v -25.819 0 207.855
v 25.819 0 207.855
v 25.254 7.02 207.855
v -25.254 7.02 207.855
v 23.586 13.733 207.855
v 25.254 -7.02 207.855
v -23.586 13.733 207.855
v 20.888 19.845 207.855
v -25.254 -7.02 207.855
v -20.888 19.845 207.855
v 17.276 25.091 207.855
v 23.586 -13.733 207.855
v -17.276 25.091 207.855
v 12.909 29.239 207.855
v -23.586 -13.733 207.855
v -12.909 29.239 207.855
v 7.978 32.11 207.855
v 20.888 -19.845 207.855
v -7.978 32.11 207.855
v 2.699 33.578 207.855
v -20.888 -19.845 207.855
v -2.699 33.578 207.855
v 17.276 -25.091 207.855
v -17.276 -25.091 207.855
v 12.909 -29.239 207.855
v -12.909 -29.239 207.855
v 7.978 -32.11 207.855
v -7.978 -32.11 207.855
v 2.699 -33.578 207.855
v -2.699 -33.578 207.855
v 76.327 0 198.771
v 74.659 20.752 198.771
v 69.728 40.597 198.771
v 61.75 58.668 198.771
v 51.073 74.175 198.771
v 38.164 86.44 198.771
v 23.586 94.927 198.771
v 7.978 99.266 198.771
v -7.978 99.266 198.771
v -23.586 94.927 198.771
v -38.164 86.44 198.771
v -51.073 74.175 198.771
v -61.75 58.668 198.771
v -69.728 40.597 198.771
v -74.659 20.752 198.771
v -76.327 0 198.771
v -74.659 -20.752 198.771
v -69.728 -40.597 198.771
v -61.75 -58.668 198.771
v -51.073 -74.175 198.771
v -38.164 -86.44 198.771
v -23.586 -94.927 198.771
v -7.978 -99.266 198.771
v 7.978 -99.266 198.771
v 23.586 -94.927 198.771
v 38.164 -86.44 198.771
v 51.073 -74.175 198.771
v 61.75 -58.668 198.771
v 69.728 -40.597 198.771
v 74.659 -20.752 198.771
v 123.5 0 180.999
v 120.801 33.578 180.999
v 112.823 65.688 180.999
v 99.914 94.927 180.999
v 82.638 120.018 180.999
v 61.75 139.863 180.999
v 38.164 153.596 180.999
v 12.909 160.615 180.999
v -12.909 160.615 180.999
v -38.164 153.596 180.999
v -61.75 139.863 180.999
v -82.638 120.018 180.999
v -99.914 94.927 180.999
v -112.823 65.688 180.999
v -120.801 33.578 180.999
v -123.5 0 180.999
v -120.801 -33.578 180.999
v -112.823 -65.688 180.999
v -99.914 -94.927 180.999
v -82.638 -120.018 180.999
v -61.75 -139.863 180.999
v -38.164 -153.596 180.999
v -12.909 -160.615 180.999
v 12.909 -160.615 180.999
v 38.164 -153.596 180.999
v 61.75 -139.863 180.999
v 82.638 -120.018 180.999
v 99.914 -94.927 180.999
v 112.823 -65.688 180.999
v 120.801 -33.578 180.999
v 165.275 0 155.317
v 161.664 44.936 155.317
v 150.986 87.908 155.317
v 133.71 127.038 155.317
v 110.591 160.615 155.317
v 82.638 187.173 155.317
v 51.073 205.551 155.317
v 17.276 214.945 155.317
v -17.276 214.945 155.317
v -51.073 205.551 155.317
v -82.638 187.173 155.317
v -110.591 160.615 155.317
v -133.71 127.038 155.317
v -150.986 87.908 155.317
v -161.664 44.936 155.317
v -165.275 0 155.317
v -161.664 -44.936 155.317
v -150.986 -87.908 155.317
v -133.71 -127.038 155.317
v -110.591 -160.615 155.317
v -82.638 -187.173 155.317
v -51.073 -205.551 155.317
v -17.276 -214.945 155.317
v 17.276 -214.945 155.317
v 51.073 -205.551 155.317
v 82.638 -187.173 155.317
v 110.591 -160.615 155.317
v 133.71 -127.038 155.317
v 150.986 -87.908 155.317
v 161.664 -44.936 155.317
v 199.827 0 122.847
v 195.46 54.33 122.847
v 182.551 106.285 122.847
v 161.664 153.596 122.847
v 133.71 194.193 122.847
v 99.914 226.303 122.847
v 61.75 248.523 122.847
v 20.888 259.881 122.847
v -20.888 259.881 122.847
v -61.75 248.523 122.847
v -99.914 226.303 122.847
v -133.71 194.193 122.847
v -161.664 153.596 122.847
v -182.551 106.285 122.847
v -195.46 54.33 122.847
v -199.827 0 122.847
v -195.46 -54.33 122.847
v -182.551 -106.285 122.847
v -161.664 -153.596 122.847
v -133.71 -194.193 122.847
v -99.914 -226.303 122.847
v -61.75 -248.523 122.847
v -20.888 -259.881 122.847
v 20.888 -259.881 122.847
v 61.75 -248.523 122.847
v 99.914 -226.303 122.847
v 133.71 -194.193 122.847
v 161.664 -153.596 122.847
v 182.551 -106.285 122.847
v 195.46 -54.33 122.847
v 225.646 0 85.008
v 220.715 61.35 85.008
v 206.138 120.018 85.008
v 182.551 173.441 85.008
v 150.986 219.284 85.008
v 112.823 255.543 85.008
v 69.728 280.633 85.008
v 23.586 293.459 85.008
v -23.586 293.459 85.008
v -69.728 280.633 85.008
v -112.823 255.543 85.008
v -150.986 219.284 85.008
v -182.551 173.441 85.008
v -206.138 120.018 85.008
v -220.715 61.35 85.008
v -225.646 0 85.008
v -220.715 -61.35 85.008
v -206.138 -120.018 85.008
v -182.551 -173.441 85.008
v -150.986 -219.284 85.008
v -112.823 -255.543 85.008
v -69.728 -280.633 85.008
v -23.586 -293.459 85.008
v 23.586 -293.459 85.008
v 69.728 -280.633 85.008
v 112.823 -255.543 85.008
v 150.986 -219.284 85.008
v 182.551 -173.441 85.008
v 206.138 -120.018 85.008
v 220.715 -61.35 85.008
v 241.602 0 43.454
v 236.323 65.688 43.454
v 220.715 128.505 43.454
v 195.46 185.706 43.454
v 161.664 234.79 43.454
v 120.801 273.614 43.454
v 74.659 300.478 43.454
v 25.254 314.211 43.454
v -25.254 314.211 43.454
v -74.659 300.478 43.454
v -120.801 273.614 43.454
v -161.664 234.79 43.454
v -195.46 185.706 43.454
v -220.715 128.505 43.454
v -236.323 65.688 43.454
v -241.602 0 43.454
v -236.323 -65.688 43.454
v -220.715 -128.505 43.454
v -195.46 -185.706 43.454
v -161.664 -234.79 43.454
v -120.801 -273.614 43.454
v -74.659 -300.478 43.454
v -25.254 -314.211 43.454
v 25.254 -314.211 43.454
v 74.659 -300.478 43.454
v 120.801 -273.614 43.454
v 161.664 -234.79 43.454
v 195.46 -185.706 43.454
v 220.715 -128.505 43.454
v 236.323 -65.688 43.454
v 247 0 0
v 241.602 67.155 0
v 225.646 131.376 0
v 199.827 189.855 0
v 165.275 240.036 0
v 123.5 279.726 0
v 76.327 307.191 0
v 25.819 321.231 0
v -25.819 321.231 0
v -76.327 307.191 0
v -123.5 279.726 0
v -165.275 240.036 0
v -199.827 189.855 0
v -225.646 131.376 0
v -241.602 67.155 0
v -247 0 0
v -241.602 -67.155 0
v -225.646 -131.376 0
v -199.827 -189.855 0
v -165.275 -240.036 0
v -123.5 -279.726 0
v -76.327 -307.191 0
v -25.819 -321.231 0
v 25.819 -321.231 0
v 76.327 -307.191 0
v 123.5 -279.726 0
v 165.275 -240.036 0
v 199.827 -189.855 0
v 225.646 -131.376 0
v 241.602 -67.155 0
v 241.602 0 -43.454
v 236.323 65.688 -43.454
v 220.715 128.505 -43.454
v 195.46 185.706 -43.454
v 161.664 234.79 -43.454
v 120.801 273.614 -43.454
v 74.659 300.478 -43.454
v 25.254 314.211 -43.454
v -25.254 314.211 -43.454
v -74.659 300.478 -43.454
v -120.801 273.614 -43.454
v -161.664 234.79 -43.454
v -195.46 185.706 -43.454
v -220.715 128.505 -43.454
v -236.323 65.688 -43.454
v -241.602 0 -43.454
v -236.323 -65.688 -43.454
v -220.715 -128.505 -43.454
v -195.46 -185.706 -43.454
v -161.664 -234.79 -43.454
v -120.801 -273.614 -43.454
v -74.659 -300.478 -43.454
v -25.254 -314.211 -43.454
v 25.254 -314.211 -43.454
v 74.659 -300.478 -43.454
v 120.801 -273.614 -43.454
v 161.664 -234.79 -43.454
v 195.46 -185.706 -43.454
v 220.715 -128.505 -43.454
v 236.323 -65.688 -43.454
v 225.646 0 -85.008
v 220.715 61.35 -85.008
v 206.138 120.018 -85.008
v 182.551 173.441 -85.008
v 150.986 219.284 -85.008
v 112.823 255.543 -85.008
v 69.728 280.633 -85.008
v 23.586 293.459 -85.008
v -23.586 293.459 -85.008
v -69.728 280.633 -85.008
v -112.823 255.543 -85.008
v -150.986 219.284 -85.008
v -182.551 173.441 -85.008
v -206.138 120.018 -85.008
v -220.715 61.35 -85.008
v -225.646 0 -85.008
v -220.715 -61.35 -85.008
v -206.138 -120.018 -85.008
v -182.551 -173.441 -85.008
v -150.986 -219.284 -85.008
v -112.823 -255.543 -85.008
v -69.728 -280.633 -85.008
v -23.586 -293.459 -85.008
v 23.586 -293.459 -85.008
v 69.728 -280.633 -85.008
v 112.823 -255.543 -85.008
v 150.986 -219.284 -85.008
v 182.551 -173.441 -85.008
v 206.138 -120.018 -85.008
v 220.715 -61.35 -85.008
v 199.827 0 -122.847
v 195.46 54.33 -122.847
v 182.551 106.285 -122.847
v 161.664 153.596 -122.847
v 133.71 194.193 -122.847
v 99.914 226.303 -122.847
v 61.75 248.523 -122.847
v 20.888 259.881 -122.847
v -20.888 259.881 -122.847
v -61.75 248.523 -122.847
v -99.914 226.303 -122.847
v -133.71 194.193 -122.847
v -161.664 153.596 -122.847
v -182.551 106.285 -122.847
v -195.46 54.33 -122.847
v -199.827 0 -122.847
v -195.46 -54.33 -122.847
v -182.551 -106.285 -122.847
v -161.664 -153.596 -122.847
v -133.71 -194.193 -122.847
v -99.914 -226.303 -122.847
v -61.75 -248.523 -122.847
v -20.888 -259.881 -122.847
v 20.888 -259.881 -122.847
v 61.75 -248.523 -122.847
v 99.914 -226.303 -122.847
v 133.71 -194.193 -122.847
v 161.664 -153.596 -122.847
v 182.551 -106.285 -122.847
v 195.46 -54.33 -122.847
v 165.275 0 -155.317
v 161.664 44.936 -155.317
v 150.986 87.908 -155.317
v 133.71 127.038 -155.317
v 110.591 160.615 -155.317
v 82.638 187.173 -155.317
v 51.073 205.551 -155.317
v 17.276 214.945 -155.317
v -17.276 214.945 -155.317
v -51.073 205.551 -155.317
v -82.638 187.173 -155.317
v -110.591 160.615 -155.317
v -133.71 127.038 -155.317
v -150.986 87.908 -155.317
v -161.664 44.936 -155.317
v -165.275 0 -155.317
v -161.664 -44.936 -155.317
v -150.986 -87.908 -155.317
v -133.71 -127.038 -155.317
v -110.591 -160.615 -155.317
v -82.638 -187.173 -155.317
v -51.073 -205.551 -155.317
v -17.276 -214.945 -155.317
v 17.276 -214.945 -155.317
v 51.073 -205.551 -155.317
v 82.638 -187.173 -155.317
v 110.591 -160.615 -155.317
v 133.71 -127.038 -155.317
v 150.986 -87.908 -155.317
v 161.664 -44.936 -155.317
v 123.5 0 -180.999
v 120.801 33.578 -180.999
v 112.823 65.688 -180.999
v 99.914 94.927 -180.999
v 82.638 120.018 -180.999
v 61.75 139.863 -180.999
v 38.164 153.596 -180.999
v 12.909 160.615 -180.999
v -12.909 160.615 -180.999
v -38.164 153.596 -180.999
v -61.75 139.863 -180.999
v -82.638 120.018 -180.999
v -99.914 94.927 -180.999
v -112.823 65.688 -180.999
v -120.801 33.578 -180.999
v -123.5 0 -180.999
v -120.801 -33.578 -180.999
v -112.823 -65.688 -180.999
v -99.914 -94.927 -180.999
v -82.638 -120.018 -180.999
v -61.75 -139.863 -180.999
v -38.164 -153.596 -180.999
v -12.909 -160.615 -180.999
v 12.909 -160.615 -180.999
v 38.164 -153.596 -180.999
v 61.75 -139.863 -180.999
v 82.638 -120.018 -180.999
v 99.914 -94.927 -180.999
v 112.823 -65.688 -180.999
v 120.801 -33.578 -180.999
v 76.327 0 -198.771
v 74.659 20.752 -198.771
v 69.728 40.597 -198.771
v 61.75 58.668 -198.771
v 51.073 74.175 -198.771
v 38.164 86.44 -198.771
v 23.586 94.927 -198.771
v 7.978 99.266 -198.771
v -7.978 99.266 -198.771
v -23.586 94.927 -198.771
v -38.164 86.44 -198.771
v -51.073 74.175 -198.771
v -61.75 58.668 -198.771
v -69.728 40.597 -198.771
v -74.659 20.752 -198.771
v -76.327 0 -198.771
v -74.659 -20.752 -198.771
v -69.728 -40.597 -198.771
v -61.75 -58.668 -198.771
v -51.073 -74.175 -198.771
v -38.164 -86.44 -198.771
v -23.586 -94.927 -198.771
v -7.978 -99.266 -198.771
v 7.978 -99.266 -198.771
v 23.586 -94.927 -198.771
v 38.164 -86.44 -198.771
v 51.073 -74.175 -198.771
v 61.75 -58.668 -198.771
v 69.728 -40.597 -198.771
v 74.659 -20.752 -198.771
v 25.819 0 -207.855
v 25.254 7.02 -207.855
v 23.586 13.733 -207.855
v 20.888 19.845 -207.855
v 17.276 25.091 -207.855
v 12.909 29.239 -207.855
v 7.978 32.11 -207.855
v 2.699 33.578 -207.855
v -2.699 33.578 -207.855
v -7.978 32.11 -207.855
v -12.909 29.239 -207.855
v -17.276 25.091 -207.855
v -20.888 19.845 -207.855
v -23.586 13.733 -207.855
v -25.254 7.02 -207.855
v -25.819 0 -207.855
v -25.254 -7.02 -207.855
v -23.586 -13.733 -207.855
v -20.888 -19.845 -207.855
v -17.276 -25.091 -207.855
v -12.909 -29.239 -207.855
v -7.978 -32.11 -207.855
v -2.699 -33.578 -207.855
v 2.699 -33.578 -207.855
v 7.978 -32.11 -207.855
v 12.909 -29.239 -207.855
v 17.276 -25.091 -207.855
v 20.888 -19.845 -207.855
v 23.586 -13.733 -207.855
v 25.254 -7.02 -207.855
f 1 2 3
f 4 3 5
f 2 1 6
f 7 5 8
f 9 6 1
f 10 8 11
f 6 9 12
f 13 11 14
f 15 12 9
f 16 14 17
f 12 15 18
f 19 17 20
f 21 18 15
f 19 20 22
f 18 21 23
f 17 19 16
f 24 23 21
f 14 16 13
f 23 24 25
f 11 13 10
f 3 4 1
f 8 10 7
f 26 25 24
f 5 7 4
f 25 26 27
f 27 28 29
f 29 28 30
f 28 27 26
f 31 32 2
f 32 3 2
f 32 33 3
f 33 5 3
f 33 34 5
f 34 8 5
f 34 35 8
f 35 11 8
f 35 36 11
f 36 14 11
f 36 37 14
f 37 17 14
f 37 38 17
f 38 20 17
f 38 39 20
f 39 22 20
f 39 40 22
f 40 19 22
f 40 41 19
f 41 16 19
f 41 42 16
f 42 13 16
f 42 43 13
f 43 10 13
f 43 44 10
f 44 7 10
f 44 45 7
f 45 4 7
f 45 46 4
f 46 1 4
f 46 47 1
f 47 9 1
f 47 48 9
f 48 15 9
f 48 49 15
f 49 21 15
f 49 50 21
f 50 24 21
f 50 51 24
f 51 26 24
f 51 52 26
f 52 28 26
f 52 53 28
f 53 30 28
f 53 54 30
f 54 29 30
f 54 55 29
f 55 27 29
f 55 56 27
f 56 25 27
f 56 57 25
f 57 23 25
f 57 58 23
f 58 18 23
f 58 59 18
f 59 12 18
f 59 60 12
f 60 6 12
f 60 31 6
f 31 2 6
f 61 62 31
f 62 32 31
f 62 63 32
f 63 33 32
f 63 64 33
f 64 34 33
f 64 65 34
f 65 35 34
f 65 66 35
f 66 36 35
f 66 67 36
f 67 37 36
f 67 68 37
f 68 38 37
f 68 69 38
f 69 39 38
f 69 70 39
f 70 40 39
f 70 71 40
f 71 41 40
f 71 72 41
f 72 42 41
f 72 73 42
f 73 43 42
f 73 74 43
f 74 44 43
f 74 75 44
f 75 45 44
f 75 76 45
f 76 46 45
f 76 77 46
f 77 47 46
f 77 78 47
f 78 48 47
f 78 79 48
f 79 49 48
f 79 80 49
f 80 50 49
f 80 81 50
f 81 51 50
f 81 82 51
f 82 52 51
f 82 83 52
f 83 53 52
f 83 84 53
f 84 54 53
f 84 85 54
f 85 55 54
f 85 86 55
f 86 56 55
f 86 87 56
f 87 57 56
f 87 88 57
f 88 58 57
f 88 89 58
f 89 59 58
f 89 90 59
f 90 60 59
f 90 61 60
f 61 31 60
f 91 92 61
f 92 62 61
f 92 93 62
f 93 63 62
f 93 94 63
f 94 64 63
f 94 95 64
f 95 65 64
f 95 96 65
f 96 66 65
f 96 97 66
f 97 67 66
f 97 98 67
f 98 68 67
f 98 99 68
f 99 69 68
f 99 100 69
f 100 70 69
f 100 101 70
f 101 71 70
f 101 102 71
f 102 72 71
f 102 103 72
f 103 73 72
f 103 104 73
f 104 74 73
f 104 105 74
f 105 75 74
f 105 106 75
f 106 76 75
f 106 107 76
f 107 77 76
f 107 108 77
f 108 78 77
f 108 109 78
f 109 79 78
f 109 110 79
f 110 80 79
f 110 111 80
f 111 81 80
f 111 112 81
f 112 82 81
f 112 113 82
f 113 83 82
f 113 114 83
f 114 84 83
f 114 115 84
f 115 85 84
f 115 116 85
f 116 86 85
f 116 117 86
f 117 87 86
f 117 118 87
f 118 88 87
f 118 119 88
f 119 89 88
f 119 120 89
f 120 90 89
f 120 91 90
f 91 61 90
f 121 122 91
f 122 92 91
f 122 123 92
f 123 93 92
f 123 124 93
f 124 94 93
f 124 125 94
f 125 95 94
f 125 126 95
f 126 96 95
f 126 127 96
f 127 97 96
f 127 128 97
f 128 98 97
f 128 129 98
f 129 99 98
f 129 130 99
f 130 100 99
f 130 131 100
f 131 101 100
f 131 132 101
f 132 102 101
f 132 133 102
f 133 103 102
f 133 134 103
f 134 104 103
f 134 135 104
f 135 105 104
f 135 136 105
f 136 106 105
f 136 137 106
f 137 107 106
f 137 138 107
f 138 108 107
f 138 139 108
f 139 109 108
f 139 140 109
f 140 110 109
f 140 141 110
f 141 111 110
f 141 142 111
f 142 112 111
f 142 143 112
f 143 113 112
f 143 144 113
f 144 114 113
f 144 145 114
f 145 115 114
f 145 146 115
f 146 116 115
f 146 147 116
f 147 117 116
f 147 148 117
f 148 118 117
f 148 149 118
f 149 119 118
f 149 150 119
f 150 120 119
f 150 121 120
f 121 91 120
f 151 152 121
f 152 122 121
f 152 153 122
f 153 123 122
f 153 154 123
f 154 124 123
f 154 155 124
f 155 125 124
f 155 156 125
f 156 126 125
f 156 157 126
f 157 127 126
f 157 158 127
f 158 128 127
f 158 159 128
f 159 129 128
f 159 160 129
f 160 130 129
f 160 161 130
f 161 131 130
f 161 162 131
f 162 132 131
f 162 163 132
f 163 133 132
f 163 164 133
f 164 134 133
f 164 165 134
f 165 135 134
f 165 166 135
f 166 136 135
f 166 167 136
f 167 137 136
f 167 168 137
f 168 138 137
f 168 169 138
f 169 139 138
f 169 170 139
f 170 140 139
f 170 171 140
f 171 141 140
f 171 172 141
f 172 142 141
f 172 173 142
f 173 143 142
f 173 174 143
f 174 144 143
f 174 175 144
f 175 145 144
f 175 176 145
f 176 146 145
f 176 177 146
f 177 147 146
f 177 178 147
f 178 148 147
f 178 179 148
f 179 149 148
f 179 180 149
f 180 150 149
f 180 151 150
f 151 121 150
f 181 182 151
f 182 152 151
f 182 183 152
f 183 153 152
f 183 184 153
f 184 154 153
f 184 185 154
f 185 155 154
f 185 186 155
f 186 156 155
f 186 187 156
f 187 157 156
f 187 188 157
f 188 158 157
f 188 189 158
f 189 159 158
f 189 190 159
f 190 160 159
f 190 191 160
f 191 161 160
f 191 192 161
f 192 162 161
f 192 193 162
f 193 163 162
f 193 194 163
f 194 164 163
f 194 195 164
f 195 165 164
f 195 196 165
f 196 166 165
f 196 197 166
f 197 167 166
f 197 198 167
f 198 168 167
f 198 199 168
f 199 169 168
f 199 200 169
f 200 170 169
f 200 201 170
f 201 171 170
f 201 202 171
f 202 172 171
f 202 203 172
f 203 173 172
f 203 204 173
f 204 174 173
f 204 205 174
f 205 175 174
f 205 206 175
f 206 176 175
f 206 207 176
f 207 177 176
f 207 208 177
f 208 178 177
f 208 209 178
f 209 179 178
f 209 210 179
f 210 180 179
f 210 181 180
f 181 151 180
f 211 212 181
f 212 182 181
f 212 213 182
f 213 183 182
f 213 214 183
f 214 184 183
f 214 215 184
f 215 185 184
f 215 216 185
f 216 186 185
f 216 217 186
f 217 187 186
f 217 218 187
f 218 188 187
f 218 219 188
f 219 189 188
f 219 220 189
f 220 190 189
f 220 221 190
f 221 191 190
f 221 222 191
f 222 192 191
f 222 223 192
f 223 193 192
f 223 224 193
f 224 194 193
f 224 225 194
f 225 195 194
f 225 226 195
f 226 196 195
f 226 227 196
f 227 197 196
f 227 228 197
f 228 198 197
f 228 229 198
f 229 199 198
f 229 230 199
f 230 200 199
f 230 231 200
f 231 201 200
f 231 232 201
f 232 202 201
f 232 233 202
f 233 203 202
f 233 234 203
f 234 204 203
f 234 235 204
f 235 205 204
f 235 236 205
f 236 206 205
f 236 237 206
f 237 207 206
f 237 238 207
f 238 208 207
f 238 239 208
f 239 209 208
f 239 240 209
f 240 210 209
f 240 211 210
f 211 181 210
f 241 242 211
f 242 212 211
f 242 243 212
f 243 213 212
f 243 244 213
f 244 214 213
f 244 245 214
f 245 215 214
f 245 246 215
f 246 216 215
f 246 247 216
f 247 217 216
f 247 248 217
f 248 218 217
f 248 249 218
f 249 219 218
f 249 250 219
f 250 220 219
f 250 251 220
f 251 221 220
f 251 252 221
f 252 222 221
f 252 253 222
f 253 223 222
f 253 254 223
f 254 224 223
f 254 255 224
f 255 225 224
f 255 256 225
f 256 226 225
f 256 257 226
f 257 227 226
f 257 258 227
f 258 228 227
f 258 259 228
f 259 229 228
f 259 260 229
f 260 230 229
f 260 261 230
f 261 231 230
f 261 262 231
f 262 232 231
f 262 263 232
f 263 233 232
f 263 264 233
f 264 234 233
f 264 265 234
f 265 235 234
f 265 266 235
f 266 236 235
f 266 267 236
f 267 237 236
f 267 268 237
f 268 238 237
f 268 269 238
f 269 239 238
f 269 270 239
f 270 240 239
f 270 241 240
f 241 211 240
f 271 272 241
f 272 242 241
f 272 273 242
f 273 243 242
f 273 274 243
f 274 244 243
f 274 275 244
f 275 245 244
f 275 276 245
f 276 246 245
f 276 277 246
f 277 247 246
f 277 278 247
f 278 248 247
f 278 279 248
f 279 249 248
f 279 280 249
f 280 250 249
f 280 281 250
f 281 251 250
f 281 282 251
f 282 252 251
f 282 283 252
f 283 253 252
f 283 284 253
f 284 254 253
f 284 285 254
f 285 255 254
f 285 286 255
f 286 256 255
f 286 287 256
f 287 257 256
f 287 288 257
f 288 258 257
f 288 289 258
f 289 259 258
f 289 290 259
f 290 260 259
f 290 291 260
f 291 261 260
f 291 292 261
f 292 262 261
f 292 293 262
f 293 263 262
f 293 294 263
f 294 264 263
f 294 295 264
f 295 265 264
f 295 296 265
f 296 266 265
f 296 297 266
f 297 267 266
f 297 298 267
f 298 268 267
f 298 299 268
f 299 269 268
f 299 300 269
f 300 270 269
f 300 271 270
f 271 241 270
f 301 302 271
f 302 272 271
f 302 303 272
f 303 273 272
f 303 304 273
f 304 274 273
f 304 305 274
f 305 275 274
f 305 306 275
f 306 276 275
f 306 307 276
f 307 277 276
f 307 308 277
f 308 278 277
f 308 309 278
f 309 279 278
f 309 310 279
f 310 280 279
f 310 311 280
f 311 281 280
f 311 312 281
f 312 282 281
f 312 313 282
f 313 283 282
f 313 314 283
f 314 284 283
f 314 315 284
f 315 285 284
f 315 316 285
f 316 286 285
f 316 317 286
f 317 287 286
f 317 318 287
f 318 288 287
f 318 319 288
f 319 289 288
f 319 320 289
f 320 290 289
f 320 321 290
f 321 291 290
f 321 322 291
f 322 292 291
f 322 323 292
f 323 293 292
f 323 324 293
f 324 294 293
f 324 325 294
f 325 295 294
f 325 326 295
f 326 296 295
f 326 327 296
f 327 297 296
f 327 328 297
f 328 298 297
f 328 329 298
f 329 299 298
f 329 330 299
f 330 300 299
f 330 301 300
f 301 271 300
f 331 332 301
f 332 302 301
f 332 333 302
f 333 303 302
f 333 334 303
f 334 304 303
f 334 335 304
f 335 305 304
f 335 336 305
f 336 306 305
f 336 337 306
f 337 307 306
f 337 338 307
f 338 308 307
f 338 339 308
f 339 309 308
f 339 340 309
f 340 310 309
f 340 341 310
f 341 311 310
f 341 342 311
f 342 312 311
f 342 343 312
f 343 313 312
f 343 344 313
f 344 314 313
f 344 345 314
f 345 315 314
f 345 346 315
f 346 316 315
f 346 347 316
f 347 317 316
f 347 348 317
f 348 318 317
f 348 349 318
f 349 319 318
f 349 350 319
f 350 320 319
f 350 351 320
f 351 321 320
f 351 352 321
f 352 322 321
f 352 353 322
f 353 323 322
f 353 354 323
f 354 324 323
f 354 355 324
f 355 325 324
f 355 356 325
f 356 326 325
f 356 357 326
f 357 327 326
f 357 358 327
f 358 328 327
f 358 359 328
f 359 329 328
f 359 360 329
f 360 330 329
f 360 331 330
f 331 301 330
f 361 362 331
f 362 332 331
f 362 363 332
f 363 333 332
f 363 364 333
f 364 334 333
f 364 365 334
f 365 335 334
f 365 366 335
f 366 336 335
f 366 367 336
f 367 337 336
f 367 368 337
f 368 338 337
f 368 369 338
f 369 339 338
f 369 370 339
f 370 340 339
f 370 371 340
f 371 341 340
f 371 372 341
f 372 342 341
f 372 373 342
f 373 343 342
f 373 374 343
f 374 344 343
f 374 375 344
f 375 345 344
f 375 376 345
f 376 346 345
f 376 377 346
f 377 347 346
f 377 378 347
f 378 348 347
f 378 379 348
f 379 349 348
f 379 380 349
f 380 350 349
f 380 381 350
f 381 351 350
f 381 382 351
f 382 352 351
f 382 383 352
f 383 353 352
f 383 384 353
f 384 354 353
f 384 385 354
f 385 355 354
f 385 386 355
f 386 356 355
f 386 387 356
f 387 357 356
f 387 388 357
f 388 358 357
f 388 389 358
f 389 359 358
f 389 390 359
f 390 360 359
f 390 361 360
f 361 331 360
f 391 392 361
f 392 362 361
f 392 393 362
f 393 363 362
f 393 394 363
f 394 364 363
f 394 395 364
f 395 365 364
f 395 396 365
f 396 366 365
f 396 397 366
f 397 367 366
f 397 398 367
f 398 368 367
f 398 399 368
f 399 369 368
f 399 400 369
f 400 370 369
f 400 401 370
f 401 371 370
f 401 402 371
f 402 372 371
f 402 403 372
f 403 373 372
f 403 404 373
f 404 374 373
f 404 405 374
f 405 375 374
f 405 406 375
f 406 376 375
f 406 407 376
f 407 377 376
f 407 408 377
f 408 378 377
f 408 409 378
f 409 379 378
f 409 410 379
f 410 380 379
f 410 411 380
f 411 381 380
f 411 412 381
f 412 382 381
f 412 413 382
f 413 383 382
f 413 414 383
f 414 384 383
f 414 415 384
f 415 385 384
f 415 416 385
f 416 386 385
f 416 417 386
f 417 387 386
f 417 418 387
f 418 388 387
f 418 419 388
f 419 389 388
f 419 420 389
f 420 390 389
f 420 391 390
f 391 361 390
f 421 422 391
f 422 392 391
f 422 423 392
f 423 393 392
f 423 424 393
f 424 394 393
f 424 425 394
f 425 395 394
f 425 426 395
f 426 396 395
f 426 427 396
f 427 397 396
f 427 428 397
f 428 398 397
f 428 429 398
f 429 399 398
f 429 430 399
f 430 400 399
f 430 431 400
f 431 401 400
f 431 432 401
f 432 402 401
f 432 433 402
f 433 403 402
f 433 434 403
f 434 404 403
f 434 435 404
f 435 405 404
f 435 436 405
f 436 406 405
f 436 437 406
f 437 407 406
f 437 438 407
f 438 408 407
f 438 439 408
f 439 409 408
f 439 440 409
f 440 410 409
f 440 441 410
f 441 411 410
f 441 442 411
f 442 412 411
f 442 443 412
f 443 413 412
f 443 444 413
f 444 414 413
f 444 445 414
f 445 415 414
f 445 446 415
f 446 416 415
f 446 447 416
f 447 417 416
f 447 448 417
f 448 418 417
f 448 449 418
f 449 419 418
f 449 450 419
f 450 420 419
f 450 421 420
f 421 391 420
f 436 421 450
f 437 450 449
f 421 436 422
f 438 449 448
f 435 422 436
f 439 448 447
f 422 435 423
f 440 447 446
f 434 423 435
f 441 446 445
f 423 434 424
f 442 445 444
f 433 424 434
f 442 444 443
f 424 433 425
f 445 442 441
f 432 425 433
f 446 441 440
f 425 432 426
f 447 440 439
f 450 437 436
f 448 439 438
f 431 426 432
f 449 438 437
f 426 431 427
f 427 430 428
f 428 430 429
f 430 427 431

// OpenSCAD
// Generated by SolidPython 1.0.1 on 2020-07-29 00:46:51


scale(v = [13, 17, 11]) {
	sphere(r = 19);
}
/***********************************************
*********      SolidPython code:      **********
************************************************
 
# import packages: SolidPython
from solid import *
from solid.utils import *
from itertools import chain, combinations, permutations


class Resize:

    def __init__(self, scad_file):
        self.scad_file = scad_file
        #self.scad_file = import_scad(scad_file)
        # cone/cylinder param:
        self.r1 = 0
        self.r2 = 0
        self.h = 0
        # rectangular prism param:
        self.w = 0
        self.l = 0
        # ellipse param:
        self.r = 0

    # import OpenScad code (file name corresponds to shape)


    # classify shape + parameters
    def assign(self, param1, param2, param3):
        if self.scad_file == 'cone.scad':
            self.r1 = param1
            self.r2 = param2
            self.h = param3
        elif self.scad_file == 'cylinder.scad':
            self.r1 = param1
            self.r2 = param2
            self.h = param3
        elif self.scad_file == 'rectangularPrism.scad':
            self.h = param1
            self.l = param2
            self.w = param3
        else:
            self.r = param1
            self.h = param2

    # resize parameters
    def iterate(self):
        x = range(3, 20, 2)
        i = 1
        if self.scad_file == 'cone.scad':
            tempList = list(permutations(x, 2))
            for temp in tempList:
                param1 = temp[0]
                param2 = temp[1]
                filepath = 'produced_scad_files/' + 'cone' + str(param1) + '_' + str(param2) + '_' + '.scad'
                scad_render_to_file(cylinder(h=param1, r1=param2, r2=0), filepath)

        elif self.scad_file == 'cylinder.scad':
            tempList = list(permutations(x, 3))
            for temp in tempList:
                param1 = temp[0]
                param2 = temp[1]
                filepath = 'produced_scad_files/' + 'cylinder' + str(param1) + '_' + str(param2) + '_' + '.scad'
                scad_render_to_file(cylinder(h=param1, r1=param2, r2=param2), filepath)

        elif self.scad_file == 'rectangularPrism.scad':
            tempList = list(permutations(x, 3))
            for temp in tempList:
                param1 = temp[0]
                param2 = temp[1]
                param3 = temp[2]
                filepath = 'produced_scad_files/' + 'rectangularPrism' + str(param1) + '_' + str(param2) + '_' + str(
                    param3) + '.scad'
                scad_render_to_file(cube(size=(param1, param2, param3)), filepath)

        elif self.scad_file == 'ellipse.scad':
            tempList = list(permutations(x, 4))
            for temp in tempList:
                param1 = temp[0]
                param2 = temp[1]
                param3 = temp[2]
                param4 = temp[3]
                filepath = 'produced_scad_files/' + 'ellipse' + str(param1) + '_' + str(param2) + '_' + str(param3) + '_' + str(param4) + '.scad'
                scad_render_to_file(scale([param1, param2, param3])(sphere(r=param4)), filepath)

    def render_to_scadfile(self):
        scad_render_to_file(scad, 'example.scad') 
 
************************************************/
